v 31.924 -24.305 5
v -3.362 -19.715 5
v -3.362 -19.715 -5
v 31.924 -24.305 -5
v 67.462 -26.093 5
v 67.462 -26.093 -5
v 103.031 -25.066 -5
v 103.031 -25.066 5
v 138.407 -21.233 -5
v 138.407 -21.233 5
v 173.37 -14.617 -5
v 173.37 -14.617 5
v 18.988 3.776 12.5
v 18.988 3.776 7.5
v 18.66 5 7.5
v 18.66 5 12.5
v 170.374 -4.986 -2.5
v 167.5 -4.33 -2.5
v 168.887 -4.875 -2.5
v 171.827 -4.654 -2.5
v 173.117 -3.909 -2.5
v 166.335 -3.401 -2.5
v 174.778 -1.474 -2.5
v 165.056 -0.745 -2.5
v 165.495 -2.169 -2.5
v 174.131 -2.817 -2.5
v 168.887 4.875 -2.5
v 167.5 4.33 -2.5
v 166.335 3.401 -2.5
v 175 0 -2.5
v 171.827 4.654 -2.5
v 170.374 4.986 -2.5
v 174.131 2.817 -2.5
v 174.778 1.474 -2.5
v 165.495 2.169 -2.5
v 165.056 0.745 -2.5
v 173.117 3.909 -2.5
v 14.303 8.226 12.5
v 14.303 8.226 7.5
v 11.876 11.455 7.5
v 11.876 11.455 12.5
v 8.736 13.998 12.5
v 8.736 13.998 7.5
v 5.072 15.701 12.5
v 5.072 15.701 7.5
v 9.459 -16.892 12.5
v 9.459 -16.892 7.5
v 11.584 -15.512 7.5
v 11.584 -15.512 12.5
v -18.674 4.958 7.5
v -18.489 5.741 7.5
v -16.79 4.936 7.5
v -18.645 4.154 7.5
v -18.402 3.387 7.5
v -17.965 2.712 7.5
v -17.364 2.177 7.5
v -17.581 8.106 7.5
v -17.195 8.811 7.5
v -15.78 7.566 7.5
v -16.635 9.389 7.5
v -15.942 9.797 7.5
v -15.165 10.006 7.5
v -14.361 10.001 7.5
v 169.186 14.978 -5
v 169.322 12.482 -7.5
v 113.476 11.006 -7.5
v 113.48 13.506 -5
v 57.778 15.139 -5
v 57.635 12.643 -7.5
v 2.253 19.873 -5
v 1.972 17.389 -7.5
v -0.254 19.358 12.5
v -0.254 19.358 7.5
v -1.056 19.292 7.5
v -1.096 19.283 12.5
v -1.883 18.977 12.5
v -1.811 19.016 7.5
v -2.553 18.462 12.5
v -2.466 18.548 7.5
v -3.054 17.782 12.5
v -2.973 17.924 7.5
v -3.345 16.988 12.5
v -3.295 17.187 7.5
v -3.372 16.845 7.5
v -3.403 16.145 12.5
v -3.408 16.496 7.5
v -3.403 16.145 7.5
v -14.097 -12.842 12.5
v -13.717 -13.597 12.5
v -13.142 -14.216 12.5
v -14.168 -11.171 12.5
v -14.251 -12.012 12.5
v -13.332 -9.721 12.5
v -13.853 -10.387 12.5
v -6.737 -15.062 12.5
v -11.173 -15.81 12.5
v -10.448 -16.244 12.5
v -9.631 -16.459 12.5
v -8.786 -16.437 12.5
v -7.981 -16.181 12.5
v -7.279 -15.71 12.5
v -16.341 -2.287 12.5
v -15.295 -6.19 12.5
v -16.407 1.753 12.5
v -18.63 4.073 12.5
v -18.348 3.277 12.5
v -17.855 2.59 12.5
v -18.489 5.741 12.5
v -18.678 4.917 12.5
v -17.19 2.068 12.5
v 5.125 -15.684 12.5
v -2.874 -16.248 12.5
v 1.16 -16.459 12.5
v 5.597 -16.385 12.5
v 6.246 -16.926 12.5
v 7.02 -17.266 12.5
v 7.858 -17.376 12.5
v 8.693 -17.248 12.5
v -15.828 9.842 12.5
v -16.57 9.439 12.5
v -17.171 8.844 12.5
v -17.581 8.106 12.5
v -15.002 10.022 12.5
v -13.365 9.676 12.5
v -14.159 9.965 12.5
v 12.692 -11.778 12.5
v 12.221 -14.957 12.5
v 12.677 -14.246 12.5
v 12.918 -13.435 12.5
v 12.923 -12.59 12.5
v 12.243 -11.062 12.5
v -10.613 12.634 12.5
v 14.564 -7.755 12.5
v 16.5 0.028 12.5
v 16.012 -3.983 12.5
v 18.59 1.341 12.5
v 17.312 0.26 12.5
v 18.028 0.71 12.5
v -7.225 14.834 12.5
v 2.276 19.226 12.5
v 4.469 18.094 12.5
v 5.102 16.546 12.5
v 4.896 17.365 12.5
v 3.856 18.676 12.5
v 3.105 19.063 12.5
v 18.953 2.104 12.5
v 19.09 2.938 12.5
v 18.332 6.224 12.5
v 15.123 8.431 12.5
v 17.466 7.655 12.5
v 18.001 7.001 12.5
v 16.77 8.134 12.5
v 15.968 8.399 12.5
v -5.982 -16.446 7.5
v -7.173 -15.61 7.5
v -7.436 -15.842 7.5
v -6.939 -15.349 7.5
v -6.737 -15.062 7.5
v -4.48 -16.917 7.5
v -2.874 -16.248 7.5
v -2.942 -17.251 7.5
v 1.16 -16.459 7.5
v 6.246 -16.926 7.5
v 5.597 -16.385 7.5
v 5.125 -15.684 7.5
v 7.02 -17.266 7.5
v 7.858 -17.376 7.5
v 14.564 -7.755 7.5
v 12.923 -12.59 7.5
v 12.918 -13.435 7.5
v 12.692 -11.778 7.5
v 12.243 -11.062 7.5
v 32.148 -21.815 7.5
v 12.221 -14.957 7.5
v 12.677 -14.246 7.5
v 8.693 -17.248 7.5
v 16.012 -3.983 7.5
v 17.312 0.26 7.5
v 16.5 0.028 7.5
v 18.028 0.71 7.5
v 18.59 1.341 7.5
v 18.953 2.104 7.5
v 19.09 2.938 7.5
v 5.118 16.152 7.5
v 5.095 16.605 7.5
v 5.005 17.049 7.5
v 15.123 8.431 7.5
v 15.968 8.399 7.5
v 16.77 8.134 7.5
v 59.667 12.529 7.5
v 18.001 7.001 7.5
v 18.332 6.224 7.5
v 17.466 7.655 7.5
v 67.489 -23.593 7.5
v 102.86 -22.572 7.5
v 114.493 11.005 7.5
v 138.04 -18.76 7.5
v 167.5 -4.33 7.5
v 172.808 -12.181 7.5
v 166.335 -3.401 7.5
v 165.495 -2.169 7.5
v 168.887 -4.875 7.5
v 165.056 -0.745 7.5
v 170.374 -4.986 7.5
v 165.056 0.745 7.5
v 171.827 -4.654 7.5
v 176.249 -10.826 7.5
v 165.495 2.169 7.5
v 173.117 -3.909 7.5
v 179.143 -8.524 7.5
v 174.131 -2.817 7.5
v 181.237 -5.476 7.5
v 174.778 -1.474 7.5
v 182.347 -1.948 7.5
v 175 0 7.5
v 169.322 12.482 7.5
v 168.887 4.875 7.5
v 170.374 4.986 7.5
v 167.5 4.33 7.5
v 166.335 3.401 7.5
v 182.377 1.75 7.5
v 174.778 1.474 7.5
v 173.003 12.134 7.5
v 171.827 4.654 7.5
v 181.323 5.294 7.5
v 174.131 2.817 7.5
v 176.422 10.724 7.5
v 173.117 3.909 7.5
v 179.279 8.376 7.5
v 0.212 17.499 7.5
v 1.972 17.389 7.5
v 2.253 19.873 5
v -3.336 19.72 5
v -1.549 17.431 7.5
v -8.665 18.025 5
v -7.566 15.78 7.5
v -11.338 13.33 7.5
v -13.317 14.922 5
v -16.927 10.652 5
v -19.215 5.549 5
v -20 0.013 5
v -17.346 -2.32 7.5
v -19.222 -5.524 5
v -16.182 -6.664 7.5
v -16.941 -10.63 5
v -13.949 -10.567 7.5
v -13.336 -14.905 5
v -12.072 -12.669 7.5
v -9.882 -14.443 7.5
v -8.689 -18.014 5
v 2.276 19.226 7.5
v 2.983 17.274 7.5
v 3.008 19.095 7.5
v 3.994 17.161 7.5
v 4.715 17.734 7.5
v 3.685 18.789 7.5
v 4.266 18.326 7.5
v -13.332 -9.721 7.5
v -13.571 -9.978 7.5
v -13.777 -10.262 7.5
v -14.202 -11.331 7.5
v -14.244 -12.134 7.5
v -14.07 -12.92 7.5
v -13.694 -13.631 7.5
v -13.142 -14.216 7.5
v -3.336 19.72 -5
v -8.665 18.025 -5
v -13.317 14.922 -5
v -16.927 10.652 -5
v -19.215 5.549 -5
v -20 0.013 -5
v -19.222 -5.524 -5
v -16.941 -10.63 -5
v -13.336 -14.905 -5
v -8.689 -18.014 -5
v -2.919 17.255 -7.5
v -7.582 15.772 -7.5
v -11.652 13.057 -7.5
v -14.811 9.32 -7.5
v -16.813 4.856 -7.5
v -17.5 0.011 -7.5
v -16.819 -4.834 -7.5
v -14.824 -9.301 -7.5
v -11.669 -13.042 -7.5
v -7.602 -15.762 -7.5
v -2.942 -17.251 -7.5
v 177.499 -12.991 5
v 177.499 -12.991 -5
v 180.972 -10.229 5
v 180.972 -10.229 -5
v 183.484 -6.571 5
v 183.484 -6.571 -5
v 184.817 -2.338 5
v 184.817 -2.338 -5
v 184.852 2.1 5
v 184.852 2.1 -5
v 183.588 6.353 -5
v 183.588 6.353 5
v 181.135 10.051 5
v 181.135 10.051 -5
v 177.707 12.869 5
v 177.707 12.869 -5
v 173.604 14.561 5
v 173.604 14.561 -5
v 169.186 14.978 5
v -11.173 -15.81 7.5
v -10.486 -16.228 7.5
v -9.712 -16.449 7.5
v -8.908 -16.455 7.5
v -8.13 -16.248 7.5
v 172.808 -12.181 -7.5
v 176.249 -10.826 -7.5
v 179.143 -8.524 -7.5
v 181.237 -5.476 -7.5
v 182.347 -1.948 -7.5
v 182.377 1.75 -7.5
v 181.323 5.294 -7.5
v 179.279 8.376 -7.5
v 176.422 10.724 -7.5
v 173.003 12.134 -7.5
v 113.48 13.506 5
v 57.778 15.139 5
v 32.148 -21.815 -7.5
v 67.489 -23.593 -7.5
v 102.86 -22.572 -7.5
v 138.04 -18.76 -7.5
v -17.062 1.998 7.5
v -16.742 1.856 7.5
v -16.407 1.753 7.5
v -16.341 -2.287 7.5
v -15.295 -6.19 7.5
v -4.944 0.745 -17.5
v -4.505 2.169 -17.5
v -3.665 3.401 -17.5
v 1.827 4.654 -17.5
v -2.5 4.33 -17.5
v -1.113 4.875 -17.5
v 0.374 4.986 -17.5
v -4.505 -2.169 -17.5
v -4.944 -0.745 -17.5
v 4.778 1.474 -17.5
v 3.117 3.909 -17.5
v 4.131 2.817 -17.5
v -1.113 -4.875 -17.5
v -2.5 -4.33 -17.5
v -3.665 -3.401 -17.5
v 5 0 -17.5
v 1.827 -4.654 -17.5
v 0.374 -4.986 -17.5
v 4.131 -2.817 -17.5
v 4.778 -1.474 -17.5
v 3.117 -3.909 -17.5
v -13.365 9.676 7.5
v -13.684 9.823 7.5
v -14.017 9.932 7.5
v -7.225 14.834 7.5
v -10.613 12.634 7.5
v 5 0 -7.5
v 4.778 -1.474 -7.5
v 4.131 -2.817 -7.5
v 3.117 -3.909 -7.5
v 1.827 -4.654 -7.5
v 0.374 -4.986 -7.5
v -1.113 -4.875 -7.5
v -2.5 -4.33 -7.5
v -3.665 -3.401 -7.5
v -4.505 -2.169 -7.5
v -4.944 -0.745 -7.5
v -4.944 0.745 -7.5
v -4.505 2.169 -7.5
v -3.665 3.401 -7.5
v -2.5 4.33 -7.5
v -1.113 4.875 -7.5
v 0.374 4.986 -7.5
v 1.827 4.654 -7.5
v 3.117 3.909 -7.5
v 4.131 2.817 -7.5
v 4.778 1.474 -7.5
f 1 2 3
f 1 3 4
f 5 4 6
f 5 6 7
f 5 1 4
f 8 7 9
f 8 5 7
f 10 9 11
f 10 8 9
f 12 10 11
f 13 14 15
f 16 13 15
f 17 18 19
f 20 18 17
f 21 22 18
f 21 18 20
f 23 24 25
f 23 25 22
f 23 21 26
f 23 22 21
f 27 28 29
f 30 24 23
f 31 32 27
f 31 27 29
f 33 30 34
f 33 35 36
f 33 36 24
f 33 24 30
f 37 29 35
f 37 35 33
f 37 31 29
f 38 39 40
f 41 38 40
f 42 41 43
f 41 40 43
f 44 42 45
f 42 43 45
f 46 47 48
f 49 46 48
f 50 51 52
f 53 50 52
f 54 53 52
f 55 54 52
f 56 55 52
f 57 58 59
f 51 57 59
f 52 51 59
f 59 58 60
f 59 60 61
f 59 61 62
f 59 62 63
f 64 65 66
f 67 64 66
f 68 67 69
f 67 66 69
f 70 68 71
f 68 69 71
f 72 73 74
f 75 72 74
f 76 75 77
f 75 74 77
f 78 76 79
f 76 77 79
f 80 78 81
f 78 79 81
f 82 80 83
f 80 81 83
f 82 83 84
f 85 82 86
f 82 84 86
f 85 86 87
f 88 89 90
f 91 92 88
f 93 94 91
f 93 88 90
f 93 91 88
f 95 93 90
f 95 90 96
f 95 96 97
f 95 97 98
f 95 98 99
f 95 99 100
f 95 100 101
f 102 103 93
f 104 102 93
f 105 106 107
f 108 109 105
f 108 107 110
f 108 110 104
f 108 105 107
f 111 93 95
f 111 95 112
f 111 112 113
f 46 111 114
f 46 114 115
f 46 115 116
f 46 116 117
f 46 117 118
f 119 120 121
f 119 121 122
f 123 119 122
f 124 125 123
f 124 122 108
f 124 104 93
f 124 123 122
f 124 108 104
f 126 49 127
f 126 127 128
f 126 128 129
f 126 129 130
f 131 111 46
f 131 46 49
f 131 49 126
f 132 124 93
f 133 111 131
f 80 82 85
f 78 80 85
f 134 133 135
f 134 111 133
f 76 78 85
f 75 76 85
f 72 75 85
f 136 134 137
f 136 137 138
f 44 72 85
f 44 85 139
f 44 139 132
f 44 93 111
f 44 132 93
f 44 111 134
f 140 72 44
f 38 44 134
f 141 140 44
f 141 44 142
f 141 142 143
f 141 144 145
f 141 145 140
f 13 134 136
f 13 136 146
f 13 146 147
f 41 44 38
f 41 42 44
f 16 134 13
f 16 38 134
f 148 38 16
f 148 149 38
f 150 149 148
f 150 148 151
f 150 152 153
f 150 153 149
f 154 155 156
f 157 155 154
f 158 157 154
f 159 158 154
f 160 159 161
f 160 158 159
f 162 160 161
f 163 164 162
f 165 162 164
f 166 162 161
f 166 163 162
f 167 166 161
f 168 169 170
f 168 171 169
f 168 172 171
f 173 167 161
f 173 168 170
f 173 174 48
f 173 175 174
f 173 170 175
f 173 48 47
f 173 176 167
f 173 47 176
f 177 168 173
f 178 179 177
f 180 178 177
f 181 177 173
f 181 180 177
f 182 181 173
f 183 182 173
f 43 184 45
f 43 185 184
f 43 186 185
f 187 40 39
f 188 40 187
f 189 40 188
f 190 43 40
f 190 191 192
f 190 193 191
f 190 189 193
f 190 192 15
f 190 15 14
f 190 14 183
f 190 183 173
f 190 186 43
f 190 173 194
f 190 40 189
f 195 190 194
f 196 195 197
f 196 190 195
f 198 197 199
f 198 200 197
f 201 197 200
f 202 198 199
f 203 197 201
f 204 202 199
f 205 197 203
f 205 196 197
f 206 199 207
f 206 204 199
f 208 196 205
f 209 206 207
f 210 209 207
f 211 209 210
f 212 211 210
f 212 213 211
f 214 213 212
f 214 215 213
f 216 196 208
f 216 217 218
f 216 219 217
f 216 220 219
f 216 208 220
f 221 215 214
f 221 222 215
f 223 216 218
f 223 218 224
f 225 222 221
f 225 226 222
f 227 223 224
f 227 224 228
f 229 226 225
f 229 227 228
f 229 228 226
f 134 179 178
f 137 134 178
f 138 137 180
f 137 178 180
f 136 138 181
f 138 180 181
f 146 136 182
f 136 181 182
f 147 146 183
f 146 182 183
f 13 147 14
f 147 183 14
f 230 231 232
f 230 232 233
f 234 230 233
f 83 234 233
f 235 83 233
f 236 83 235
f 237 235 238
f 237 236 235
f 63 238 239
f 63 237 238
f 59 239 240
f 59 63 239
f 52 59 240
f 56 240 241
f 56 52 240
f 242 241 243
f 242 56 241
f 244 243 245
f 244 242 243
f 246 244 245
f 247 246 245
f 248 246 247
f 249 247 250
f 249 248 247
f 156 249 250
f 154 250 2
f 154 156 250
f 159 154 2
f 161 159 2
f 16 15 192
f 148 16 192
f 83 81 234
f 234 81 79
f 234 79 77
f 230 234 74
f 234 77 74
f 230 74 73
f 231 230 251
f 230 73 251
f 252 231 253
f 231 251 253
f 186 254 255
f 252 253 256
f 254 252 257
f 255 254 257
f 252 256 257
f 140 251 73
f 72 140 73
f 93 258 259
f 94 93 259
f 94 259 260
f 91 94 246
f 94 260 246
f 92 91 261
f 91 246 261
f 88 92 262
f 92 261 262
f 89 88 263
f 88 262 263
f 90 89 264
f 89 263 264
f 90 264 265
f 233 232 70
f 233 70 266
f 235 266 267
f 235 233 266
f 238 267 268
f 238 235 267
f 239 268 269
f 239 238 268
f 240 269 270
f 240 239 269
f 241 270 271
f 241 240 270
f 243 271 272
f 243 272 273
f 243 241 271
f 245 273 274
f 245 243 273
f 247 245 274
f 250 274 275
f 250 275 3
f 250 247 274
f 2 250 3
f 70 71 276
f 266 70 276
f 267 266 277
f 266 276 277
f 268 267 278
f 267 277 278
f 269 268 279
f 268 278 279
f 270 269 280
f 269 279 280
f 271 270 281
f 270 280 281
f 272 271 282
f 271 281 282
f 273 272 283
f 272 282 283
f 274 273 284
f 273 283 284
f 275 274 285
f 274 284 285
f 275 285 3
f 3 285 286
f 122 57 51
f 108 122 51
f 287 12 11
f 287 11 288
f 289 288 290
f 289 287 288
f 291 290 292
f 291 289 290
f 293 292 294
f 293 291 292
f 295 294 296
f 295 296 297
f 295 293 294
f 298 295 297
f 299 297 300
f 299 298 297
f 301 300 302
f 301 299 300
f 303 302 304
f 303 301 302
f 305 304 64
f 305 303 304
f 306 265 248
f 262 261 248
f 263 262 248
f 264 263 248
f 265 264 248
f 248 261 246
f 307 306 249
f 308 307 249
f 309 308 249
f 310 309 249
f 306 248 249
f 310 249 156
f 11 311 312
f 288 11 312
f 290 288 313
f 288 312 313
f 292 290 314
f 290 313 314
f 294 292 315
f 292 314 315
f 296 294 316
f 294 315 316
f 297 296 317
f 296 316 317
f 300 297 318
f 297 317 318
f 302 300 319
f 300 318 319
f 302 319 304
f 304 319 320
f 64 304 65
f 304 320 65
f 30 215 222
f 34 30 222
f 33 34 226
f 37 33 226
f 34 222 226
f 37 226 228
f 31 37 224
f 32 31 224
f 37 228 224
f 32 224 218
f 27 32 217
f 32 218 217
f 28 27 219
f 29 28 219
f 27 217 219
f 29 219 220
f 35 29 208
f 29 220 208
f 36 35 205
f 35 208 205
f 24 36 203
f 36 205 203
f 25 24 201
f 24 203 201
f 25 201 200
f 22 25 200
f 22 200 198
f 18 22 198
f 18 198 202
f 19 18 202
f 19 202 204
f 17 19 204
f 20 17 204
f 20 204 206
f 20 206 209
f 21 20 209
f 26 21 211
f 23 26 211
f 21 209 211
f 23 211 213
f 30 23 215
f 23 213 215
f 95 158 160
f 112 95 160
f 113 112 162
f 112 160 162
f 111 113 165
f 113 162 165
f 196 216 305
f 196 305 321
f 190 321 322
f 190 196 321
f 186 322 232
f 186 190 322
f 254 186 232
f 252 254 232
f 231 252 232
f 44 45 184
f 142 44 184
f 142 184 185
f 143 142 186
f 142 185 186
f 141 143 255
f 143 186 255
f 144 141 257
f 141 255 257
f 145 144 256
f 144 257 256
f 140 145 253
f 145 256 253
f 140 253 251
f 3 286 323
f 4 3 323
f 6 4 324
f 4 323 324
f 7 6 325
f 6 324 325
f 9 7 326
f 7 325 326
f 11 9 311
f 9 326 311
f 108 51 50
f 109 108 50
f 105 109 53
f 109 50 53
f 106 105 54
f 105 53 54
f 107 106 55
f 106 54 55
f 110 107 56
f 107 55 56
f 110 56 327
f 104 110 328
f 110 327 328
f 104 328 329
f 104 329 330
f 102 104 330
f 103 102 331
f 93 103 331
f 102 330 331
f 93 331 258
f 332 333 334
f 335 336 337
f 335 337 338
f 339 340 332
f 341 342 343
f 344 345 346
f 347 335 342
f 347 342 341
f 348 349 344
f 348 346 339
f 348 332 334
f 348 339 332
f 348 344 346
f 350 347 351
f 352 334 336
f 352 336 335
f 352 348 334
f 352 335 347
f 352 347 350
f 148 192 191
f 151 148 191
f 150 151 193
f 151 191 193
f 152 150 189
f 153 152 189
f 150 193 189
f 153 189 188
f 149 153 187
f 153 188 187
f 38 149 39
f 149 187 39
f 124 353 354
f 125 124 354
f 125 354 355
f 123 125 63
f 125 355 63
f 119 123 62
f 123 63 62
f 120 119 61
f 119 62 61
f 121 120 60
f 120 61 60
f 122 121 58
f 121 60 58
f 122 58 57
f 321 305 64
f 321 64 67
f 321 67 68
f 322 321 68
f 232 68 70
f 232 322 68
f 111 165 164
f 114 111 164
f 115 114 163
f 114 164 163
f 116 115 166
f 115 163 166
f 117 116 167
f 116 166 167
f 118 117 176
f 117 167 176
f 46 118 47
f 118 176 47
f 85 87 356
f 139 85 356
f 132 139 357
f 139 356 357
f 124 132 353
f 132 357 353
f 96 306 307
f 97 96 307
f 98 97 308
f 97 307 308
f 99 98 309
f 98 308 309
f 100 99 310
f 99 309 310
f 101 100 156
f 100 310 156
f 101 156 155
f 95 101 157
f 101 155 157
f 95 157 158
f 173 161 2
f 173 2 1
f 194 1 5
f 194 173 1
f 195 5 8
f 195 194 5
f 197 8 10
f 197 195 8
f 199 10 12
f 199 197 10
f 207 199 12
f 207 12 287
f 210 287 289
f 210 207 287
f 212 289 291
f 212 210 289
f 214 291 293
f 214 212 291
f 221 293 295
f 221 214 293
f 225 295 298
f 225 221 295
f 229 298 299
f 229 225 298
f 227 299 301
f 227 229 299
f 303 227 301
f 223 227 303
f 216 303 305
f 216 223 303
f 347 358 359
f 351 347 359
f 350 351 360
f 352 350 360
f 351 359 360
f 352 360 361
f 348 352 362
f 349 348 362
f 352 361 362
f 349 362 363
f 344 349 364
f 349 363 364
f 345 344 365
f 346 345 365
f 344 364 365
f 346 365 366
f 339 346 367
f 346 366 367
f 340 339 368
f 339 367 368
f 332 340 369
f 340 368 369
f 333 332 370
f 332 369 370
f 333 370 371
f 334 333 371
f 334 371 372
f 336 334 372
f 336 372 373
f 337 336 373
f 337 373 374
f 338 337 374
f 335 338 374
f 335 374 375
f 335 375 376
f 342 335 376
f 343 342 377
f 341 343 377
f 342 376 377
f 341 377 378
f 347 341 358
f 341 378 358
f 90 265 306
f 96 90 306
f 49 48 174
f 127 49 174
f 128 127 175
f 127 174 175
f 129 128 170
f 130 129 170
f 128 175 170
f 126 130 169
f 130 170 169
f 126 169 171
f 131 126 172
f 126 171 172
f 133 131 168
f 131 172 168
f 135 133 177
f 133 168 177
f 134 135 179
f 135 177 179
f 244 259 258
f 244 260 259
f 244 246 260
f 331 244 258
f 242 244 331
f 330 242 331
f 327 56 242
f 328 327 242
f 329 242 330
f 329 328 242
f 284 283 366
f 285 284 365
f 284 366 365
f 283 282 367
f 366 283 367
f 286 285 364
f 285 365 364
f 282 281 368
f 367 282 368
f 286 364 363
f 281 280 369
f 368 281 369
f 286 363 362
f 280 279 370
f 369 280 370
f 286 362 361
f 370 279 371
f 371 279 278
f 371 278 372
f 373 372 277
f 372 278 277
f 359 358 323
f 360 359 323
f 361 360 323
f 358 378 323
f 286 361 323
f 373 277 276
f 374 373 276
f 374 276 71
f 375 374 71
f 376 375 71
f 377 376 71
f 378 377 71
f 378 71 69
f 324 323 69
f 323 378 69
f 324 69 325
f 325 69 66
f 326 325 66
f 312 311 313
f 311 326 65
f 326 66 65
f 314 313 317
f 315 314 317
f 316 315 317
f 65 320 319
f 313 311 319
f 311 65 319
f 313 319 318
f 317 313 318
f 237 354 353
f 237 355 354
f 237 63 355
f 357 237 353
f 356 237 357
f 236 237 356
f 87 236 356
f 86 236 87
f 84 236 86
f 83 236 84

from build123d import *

# Parameters (mm, degrees)
BOSS_EXTRUDE1_DEPTH = 7.5
CHAMFER1_SIZE       = 2.5
SKETCH2_R           = 16.5
BOSS_EXTRUDE2_DEPTH = 5
BOSS_EXTRUDE3_START = -5
BOSS_EXTRUDE3_DEPTH = 5
SKETCH4_R           = 5
CUT_EXTRUDE1_DEPTH  = 10
SKETCH5_R           = 5
BOSS_EXTRUDE4_DEPTH = 10


with BuildPart() as part:
    # Sketch1 → Boss-Extrude1 (new, symmetric)
    with BuildSketch(Plane.XY):
        with BuildLine():
            ThreePointArc((169.186105477, 14.977902914), (85.617423728, 13.934366249), (2.253460208, 19.872642429))
            ThreePointArc((2.253460208, 19.872642429), (-19.801791361, 2.808746854), (-3.361833105, -19.715427415))
            ThreePointArc((-3.361833105, -19.715427415), (85.256800738, -25.931146508), (173.369675456, -14.61660998))
            ThreePointArc((173.369675456, -14.61660998), (184.852333231, 2.099570811), (169.186105477, 14.977902914))
        make_face()
    extrude(amount=BOSS_EXTRUDE1_DEPTH, both=True)

    # Chamfer1
    chamfer1_edges = [part.edges().sort_by_distance(p)[0] for p in [
        (85.617423728, 13.934366249, 7.5),
        (184.852333231, 2.099570811, 7.5),
        (184.852333231, 2.099570811, -7.5),
        (-19.801791361, 2.808746854, 7.5),
        (85.256800738, -25.931146508, 7.5),
        (-19.801791361, 2.808746854, -7.5),
        (85.617423728, 13.934366249, -7.5),
        (85.256800738, -25.931146508, -7.5),
    ]]
    chamfer(chamfer1_edges, length=CHAMFER1_SIZE)

    # Sketch2 → Boss-Extrude2 (add)
    with BuildSketch(Plane.XY.offset(7.5)):
        Circle(SKETCH2_R)
    extrude(amount=BOSS_EXTRUDE2_DEPTH)

    # Sketch3 → Boss-Extrude3 (add)
    with BuildSketch(Plane.XY.offset(12.5).offset(BOSS_EXTRUDE3_START)):
        with BuildLine():
            ThreePointArc((-0.253915773, 19.358335376), (-2.55345676, 18.462340064), (-3.403051231, 16.145254483))
            ThreePointArc((-3.403051231, 16.145254483), (0.863543278, 16.477387323), (5.0720476, 15.701093374))
            ThreePointArc((5.0720476, 15.701093374), (4.469308692, 18.094292522), (2.276021844, 19.225746964))
            Line((2.276021844, 19.225746964), (-0.253915773, 19.358335376))
        make_face()
        with BuildLine():
            ThreePointArc((14.30344882, 8.225652062), (15.249383609, 6.301293481), (15.937776134, 4.270514244))
            Line((15.937776134, 4.270514244), (18.660254038, 5))
            Line((18.660254038, 5), (18.332406715, 6.223542865))
            ThreePointArc((18.332406715, 6.223542865), (16.76966729, 8.133658527), (14.30344882, 8.225652062))
        make_face()
        with BuildLine():
            Line((18.660254038, 5), (15.937776134, 4.270514244))
            ThreePointArc((15.937776134, 4.270514244), (16.357000338, 2.167611574), (16.499976071, 0.028100762))
            ThreePointArc((16.499976071, 0.028100762), (18.58978715, 1.340878735), (18.98810136, 3.776457135))
            Line((18.98810136, 3.776457135), (18.660254038, 5))
        make_face()
        with BuildLine():
            ThreePointArc((11.583966219, -15.511974356), (12.917681126, -13.435462641), (12.243068758, -11.061521929))
            ThreePointArc((12.243068758, -11.061521929), (8.986544078, -13.838064371), (5.125498425, -15.683726148))
            ThreePointArc((5.125498425, -15.683726148), (7.01981161, -17.265583889), (9.459270178, -16.891768097))
            Line((9.459270178, -16.891768097), (11.583966219, -15.511974356))
        make_face()
        with BuildLine():
            ThreePointArc((-11.173121868, -15.810470249), (-8.786101299, -16.437231094), (-6.736816201, -15.062048582))
            ThreePointArc((-6.736816201, -15.062048582), (-10.383786452, -12.822908364), (-13.332243835, -9.721176591))
            ThreePointArc((-13.332243835, -9.721176591), (-14.25130498, -12.011596414), (-13.141950881, -14.21614395))
            Line((-13.141950881, -14.21614395), (-11.173121868, -15.810470249))
        make_face()
        with BuildLine():
            Line((0, 0), (-13.017345465, 9.457655082))
            ThreePointArc((-13.017345465, 9.457655082), (-15.632747256, 9.907063304), (-17.581442501, 8.105707948))
            Line((-17.581442501, 8.105707948), (-18.489335293, 5.740566364))
            ThreePointArc((-18.489335293, 5.740566364), (-18.246514507, 3.097966821), (-16.002179404, 1.681896829))
            Line((-16.002179404, 1.681896829), (0, 0))
        make_face()
    extrude(amount=BOSS_EXTRUDE3_DEPTH)

    # Sketch4 → Cut-Extrude1 (cut)
    with BuildSketch(Plane.XY.offset(7.5)):
        with Locations((170, 0)):
            Circle(SKETCH4_R)
    extrude(amount=-CUT_EXTRUDE1_DEPTH, mode=Mode.SUBTRACT)

    # Sketch5 → Boss-Extrude4 (add)
    with BuildSketch(Plane(origin=(0, 0, -7.5), x_dir=(-1, 0, 0), z_dir=(0, 0, -1))):
        with Locations(Location((0, 0, 0), (0, 0, 180))):
            Circle(SKETCH5_R)
    extrude(amount=BOSS_EXTRUDE4_DEPTH)


solid = part.part
